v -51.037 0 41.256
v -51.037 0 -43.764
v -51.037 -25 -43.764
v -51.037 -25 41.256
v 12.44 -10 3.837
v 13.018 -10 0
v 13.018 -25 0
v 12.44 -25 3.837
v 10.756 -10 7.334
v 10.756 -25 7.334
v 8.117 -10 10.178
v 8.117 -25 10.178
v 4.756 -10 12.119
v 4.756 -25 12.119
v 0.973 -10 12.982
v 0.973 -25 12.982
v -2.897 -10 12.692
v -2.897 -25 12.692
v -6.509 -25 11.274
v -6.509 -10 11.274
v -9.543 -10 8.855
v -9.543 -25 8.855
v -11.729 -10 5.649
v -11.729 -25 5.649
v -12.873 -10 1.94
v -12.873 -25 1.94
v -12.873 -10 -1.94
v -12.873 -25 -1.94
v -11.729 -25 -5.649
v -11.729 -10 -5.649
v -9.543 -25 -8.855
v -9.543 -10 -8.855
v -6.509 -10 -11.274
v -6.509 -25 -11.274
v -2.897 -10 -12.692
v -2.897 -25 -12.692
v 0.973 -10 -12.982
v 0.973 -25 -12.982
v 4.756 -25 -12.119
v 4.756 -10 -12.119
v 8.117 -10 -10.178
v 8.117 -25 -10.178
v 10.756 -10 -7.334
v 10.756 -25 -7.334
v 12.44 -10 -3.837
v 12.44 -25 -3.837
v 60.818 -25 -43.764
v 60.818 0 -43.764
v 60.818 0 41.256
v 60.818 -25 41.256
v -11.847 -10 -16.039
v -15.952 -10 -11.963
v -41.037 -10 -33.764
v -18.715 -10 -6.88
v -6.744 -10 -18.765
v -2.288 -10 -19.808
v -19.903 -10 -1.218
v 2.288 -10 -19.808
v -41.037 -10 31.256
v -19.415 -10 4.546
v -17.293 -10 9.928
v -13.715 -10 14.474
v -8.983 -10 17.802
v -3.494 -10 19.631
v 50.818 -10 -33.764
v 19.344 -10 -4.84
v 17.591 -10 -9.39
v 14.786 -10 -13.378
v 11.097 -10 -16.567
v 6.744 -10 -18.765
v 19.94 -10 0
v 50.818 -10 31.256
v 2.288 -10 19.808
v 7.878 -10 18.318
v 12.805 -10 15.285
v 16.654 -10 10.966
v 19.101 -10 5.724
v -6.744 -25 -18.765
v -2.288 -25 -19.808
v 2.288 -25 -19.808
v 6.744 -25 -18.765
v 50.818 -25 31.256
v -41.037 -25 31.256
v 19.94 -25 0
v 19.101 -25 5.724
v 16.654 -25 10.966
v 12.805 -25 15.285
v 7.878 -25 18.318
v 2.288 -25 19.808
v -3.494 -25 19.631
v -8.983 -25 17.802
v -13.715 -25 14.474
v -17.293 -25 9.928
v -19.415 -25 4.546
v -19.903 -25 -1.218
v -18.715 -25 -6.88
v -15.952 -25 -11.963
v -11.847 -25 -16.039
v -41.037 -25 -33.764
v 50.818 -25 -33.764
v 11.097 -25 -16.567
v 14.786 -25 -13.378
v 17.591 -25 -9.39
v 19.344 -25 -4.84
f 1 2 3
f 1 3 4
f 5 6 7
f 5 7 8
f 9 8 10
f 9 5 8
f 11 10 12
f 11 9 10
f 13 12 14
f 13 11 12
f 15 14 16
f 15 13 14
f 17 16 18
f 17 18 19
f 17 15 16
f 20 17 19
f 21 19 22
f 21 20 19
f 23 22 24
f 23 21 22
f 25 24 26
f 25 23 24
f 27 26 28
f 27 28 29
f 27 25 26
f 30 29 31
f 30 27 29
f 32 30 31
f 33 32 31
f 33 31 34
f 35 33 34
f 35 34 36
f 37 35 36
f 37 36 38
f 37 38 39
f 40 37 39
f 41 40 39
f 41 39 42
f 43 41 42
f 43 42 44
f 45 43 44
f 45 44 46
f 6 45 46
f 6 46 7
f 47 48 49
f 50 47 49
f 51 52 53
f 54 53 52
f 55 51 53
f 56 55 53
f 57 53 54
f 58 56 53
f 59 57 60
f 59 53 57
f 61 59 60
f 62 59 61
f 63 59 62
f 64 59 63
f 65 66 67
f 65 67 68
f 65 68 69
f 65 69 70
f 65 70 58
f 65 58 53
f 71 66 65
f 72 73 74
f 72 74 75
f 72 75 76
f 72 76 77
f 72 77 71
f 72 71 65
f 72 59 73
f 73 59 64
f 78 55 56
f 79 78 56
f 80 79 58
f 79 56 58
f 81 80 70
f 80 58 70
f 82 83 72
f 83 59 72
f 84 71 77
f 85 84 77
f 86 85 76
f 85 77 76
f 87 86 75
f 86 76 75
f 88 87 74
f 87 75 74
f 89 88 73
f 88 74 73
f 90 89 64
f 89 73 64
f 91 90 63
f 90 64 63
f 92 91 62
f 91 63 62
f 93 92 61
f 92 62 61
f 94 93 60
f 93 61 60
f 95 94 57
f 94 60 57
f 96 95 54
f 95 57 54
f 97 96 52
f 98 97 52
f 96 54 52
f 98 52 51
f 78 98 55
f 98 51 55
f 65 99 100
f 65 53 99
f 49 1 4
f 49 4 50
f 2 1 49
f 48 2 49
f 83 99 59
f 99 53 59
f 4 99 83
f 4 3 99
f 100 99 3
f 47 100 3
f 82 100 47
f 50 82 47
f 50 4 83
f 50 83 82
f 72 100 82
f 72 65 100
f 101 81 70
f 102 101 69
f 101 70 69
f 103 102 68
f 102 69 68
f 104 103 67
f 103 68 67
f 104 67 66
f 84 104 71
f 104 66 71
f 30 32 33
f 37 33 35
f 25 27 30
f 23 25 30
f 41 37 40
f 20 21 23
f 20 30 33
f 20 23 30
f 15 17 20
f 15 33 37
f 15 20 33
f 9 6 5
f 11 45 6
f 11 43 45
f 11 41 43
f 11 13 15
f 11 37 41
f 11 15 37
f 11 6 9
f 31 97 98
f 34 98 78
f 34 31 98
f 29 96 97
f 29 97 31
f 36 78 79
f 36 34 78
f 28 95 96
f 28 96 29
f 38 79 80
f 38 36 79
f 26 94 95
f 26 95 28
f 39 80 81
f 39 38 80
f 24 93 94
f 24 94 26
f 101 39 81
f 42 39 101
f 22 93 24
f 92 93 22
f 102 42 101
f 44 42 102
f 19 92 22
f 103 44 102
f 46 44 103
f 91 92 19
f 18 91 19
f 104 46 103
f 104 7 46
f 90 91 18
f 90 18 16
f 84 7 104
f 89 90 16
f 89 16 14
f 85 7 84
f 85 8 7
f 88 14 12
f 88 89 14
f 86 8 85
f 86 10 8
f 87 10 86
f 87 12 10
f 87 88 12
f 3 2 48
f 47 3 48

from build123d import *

# Parameters (mm, degrees)
F0_W     = 111.855097
F0_H     = 85.019909
F1_DEPTH = 25
F2_T     = -10
F3_R     = 13.018473
F4_DEPTH = 25


with BuildPart() as f1:
    # F0 (on Front) → F1 (new body)
    with BuildSketch(Plane.XZ):
        with Locations((4.890524, -1.253982)):
            Rectangle(F0_W, F0_H)
    extrude(amount=F1_DEPTH)

    # F2
    f2_openings = [f1.faces().sort_by_distance(p)[0] for p in [
        (4.890524, -25, -1.253981),
    ]]
    offset(amount=F2_T, openings=f2_openings)

    # F3 (on Front) → F4 (join)
    with BuildSketch(Plane.XZ):
        with BuildLine():
            ThreePointArc((6.744158, -18.764725), (16.310675, -11.469981), (19.939874, 0))
            ThreePointArc((19.939874, 0), (-11.469981, 16.310675), (-6.744158, -18.764725))
            ThreePointArc((-6.744158, -18.764725), (0, -19.939874), (6.744158, -18.764725))
        make_face()
        Circle(F3_R, mode=Mode.SUBTRACT)
    extrude(amount=F4_DEPTH)


solid = f1.part
